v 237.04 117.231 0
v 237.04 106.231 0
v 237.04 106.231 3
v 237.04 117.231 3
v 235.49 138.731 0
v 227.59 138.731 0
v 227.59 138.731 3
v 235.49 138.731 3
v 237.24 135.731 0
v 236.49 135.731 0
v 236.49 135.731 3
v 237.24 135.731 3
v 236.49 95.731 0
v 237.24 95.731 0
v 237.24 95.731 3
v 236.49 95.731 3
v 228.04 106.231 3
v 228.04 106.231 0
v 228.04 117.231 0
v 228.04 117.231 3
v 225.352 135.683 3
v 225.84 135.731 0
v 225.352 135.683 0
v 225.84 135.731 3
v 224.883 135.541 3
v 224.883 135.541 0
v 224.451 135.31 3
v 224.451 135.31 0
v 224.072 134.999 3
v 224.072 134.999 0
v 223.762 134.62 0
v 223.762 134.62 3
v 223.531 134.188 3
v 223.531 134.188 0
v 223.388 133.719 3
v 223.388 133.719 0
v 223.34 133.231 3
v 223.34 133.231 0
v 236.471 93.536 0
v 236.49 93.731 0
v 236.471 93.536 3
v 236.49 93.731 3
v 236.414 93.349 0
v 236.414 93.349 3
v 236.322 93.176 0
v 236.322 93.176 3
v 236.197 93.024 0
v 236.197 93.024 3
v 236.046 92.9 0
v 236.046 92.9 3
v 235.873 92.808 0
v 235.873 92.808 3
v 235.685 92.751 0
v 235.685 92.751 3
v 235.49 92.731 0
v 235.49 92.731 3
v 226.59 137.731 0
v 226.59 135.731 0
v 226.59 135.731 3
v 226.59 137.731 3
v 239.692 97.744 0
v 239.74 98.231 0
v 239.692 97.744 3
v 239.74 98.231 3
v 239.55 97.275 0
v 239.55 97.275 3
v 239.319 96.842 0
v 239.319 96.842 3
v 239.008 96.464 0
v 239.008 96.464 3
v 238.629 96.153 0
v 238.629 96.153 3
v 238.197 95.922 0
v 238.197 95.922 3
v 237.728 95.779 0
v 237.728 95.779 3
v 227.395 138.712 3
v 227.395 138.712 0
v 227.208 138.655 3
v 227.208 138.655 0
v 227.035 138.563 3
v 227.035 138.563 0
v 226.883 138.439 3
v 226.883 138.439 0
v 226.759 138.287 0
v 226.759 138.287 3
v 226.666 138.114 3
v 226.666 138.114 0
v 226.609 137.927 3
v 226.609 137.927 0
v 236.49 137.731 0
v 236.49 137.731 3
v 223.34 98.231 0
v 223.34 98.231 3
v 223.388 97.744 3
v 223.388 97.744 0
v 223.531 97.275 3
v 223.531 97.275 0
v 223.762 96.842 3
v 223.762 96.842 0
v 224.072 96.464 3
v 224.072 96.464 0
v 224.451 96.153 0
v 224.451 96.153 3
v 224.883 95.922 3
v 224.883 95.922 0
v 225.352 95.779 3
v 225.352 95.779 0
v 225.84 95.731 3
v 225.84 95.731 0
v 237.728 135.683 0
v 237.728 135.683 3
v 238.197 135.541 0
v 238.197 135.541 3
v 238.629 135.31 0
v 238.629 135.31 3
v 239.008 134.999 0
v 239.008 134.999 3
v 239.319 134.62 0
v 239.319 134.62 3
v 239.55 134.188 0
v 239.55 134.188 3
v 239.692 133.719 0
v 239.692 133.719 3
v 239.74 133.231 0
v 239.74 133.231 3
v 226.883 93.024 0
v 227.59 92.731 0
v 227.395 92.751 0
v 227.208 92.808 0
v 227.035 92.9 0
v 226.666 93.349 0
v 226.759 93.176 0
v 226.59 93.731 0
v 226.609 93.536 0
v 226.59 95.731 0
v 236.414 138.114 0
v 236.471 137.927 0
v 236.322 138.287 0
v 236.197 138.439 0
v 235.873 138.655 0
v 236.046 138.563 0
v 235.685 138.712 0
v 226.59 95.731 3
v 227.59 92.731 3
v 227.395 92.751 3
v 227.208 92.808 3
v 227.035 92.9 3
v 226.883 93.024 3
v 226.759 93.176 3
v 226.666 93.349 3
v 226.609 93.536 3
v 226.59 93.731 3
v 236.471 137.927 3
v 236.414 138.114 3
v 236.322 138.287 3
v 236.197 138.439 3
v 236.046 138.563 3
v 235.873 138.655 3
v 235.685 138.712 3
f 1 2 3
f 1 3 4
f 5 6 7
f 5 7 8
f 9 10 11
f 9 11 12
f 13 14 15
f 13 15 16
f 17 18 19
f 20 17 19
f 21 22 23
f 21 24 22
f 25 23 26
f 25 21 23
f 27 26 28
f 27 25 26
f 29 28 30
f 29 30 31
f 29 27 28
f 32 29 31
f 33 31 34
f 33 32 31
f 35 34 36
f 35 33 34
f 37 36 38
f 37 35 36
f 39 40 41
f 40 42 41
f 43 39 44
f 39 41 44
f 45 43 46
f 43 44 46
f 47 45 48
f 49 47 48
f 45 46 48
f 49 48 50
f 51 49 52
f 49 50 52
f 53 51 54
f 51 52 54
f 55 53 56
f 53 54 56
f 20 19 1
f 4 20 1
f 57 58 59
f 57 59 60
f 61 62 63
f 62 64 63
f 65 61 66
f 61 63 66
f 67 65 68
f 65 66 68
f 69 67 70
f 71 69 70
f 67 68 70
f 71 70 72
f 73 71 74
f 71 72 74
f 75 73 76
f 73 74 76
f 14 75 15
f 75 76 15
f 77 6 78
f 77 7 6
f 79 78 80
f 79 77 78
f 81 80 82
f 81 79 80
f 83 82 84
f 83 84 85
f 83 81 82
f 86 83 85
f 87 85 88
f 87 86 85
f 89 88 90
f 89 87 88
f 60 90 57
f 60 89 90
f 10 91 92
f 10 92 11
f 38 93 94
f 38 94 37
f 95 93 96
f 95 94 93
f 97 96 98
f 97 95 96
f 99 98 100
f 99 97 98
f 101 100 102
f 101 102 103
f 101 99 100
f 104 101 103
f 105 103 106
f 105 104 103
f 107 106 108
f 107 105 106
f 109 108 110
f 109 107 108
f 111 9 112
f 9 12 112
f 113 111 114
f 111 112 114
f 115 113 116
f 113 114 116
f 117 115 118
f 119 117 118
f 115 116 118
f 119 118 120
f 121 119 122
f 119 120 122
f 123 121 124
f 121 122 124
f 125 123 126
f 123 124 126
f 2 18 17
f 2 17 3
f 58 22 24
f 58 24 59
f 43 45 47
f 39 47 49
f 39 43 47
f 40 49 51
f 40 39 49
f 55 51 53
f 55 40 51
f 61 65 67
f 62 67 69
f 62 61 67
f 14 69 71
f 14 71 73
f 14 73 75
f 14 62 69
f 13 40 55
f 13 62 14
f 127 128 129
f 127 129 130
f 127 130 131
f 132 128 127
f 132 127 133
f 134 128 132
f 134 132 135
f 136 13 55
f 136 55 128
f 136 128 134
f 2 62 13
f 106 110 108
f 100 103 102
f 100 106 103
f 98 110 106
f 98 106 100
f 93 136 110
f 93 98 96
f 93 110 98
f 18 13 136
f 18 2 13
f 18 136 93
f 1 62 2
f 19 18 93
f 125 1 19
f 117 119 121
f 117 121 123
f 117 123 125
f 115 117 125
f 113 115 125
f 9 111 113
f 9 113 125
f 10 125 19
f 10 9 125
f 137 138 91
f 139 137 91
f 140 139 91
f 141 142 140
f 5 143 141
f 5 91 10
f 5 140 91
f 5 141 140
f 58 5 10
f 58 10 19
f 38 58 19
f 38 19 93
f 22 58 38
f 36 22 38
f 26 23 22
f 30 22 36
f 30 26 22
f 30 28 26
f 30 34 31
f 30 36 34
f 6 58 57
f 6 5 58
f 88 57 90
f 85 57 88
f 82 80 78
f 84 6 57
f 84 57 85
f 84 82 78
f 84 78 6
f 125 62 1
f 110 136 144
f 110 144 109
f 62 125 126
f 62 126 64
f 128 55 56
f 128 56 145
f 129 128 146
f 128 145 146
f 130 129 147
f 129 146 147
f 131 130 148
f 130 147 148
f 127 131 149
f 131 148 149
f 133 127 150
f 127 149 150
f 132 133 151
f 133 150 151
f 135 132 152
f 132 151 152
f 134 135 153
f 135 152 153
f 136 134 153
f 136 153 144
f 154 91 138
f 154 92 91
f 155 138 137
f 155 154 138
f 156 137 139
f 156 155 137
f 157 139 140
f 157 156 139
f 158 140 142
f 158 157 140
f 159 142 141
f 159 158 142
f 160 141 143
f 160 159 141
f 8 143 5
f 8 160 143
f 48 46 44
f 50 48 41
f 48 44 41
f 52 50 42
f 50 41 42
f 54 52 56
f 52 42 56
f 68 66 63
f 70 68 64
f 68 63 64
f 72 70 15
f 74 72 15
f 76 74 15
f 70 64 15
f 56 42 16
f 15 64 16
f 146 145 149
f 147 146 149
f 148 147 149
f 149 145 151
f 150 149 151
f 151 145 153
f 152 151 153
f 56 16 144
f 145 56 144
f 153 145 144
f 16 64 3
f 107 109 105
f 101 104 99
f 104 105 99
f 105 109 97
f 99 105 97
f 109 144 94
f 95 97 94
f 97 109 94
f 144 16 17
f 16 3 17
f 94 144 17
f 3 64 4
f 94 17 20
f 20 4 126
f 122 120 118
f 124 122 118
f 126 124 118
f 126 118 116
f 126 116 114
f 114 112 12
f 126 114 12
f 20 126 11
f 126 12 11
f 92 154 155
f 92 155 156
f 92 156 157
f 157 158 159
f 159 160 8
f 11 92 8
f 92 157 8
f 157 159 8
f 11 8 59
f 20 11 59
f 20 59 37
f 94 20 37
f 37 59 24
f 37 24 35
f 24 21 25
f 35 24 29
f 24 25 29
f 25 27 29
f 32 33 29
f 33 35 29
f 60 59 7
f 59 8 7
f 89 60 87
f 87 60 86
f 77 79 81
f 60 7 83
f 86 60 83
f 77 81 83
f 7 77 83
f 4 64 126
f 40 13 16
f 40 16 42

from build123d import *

# Parameters (mm, degrees)
SKETCH_W    = 9
SKETCH_H    = 11
PAD_DEPTH   = 3
FILLET_R    = 1
FILLET001_R = 2.5


with BuildPart() as part:
    # Sketch → Pad (new body)
    with BuildSketch(Plane.XY):
        Polygon((39.740207, 35.73141), (39.740207, -4.26859), (36.490207, -4.26859), (36.490207, -7.26859), (26.590207, -7.26859), (26.590207, -4.26859), (23.340207, -4.26859), (23.340207, 35.73141), (26.590207, 35.73141), (26.590207, 38.73141), (36.490207, 38.73141), (36.490207, 35.73141), align=None)
        with Locations((32.540207, 11.73141)):
            Rectangle(SKETCH_W, SKETCH_H, mode=Mode.SUBTRACT)
    extrude(amount=PAD_DEPTH)

    # Fillet
    fillet_edges = [part.edges().sort_by_distance(p)[0] for p in [
        (36.490207, -7.26859, 1.5),
        (26.590207, -7.26859, 1.5),
        (36.490207, 38.73141, 1.5),
        (26.590207, 38.73141, 1.5),
    ]]
    fillet(fillet_edges, radius=FILLET_R)

    # Fillet001
    fillet001_edges = [part.edges().sort_by_distance(p)[0] for p in [
        (39.740207, -4.26859, 1.5),
        (39.740207, 35.73141, 1.5),
        (23.340207, -4.26859, 1.5),
        (23.340207, 35.73141, 1.5),
    ]]
    fillet(fillet001_edges, radius=FILLET001_R)


with BuildPart() as part_1:
    # Fillet001 placement: moved
    add(part.part.moved(Location((200, 100, 0))))


solid = part_1.part
